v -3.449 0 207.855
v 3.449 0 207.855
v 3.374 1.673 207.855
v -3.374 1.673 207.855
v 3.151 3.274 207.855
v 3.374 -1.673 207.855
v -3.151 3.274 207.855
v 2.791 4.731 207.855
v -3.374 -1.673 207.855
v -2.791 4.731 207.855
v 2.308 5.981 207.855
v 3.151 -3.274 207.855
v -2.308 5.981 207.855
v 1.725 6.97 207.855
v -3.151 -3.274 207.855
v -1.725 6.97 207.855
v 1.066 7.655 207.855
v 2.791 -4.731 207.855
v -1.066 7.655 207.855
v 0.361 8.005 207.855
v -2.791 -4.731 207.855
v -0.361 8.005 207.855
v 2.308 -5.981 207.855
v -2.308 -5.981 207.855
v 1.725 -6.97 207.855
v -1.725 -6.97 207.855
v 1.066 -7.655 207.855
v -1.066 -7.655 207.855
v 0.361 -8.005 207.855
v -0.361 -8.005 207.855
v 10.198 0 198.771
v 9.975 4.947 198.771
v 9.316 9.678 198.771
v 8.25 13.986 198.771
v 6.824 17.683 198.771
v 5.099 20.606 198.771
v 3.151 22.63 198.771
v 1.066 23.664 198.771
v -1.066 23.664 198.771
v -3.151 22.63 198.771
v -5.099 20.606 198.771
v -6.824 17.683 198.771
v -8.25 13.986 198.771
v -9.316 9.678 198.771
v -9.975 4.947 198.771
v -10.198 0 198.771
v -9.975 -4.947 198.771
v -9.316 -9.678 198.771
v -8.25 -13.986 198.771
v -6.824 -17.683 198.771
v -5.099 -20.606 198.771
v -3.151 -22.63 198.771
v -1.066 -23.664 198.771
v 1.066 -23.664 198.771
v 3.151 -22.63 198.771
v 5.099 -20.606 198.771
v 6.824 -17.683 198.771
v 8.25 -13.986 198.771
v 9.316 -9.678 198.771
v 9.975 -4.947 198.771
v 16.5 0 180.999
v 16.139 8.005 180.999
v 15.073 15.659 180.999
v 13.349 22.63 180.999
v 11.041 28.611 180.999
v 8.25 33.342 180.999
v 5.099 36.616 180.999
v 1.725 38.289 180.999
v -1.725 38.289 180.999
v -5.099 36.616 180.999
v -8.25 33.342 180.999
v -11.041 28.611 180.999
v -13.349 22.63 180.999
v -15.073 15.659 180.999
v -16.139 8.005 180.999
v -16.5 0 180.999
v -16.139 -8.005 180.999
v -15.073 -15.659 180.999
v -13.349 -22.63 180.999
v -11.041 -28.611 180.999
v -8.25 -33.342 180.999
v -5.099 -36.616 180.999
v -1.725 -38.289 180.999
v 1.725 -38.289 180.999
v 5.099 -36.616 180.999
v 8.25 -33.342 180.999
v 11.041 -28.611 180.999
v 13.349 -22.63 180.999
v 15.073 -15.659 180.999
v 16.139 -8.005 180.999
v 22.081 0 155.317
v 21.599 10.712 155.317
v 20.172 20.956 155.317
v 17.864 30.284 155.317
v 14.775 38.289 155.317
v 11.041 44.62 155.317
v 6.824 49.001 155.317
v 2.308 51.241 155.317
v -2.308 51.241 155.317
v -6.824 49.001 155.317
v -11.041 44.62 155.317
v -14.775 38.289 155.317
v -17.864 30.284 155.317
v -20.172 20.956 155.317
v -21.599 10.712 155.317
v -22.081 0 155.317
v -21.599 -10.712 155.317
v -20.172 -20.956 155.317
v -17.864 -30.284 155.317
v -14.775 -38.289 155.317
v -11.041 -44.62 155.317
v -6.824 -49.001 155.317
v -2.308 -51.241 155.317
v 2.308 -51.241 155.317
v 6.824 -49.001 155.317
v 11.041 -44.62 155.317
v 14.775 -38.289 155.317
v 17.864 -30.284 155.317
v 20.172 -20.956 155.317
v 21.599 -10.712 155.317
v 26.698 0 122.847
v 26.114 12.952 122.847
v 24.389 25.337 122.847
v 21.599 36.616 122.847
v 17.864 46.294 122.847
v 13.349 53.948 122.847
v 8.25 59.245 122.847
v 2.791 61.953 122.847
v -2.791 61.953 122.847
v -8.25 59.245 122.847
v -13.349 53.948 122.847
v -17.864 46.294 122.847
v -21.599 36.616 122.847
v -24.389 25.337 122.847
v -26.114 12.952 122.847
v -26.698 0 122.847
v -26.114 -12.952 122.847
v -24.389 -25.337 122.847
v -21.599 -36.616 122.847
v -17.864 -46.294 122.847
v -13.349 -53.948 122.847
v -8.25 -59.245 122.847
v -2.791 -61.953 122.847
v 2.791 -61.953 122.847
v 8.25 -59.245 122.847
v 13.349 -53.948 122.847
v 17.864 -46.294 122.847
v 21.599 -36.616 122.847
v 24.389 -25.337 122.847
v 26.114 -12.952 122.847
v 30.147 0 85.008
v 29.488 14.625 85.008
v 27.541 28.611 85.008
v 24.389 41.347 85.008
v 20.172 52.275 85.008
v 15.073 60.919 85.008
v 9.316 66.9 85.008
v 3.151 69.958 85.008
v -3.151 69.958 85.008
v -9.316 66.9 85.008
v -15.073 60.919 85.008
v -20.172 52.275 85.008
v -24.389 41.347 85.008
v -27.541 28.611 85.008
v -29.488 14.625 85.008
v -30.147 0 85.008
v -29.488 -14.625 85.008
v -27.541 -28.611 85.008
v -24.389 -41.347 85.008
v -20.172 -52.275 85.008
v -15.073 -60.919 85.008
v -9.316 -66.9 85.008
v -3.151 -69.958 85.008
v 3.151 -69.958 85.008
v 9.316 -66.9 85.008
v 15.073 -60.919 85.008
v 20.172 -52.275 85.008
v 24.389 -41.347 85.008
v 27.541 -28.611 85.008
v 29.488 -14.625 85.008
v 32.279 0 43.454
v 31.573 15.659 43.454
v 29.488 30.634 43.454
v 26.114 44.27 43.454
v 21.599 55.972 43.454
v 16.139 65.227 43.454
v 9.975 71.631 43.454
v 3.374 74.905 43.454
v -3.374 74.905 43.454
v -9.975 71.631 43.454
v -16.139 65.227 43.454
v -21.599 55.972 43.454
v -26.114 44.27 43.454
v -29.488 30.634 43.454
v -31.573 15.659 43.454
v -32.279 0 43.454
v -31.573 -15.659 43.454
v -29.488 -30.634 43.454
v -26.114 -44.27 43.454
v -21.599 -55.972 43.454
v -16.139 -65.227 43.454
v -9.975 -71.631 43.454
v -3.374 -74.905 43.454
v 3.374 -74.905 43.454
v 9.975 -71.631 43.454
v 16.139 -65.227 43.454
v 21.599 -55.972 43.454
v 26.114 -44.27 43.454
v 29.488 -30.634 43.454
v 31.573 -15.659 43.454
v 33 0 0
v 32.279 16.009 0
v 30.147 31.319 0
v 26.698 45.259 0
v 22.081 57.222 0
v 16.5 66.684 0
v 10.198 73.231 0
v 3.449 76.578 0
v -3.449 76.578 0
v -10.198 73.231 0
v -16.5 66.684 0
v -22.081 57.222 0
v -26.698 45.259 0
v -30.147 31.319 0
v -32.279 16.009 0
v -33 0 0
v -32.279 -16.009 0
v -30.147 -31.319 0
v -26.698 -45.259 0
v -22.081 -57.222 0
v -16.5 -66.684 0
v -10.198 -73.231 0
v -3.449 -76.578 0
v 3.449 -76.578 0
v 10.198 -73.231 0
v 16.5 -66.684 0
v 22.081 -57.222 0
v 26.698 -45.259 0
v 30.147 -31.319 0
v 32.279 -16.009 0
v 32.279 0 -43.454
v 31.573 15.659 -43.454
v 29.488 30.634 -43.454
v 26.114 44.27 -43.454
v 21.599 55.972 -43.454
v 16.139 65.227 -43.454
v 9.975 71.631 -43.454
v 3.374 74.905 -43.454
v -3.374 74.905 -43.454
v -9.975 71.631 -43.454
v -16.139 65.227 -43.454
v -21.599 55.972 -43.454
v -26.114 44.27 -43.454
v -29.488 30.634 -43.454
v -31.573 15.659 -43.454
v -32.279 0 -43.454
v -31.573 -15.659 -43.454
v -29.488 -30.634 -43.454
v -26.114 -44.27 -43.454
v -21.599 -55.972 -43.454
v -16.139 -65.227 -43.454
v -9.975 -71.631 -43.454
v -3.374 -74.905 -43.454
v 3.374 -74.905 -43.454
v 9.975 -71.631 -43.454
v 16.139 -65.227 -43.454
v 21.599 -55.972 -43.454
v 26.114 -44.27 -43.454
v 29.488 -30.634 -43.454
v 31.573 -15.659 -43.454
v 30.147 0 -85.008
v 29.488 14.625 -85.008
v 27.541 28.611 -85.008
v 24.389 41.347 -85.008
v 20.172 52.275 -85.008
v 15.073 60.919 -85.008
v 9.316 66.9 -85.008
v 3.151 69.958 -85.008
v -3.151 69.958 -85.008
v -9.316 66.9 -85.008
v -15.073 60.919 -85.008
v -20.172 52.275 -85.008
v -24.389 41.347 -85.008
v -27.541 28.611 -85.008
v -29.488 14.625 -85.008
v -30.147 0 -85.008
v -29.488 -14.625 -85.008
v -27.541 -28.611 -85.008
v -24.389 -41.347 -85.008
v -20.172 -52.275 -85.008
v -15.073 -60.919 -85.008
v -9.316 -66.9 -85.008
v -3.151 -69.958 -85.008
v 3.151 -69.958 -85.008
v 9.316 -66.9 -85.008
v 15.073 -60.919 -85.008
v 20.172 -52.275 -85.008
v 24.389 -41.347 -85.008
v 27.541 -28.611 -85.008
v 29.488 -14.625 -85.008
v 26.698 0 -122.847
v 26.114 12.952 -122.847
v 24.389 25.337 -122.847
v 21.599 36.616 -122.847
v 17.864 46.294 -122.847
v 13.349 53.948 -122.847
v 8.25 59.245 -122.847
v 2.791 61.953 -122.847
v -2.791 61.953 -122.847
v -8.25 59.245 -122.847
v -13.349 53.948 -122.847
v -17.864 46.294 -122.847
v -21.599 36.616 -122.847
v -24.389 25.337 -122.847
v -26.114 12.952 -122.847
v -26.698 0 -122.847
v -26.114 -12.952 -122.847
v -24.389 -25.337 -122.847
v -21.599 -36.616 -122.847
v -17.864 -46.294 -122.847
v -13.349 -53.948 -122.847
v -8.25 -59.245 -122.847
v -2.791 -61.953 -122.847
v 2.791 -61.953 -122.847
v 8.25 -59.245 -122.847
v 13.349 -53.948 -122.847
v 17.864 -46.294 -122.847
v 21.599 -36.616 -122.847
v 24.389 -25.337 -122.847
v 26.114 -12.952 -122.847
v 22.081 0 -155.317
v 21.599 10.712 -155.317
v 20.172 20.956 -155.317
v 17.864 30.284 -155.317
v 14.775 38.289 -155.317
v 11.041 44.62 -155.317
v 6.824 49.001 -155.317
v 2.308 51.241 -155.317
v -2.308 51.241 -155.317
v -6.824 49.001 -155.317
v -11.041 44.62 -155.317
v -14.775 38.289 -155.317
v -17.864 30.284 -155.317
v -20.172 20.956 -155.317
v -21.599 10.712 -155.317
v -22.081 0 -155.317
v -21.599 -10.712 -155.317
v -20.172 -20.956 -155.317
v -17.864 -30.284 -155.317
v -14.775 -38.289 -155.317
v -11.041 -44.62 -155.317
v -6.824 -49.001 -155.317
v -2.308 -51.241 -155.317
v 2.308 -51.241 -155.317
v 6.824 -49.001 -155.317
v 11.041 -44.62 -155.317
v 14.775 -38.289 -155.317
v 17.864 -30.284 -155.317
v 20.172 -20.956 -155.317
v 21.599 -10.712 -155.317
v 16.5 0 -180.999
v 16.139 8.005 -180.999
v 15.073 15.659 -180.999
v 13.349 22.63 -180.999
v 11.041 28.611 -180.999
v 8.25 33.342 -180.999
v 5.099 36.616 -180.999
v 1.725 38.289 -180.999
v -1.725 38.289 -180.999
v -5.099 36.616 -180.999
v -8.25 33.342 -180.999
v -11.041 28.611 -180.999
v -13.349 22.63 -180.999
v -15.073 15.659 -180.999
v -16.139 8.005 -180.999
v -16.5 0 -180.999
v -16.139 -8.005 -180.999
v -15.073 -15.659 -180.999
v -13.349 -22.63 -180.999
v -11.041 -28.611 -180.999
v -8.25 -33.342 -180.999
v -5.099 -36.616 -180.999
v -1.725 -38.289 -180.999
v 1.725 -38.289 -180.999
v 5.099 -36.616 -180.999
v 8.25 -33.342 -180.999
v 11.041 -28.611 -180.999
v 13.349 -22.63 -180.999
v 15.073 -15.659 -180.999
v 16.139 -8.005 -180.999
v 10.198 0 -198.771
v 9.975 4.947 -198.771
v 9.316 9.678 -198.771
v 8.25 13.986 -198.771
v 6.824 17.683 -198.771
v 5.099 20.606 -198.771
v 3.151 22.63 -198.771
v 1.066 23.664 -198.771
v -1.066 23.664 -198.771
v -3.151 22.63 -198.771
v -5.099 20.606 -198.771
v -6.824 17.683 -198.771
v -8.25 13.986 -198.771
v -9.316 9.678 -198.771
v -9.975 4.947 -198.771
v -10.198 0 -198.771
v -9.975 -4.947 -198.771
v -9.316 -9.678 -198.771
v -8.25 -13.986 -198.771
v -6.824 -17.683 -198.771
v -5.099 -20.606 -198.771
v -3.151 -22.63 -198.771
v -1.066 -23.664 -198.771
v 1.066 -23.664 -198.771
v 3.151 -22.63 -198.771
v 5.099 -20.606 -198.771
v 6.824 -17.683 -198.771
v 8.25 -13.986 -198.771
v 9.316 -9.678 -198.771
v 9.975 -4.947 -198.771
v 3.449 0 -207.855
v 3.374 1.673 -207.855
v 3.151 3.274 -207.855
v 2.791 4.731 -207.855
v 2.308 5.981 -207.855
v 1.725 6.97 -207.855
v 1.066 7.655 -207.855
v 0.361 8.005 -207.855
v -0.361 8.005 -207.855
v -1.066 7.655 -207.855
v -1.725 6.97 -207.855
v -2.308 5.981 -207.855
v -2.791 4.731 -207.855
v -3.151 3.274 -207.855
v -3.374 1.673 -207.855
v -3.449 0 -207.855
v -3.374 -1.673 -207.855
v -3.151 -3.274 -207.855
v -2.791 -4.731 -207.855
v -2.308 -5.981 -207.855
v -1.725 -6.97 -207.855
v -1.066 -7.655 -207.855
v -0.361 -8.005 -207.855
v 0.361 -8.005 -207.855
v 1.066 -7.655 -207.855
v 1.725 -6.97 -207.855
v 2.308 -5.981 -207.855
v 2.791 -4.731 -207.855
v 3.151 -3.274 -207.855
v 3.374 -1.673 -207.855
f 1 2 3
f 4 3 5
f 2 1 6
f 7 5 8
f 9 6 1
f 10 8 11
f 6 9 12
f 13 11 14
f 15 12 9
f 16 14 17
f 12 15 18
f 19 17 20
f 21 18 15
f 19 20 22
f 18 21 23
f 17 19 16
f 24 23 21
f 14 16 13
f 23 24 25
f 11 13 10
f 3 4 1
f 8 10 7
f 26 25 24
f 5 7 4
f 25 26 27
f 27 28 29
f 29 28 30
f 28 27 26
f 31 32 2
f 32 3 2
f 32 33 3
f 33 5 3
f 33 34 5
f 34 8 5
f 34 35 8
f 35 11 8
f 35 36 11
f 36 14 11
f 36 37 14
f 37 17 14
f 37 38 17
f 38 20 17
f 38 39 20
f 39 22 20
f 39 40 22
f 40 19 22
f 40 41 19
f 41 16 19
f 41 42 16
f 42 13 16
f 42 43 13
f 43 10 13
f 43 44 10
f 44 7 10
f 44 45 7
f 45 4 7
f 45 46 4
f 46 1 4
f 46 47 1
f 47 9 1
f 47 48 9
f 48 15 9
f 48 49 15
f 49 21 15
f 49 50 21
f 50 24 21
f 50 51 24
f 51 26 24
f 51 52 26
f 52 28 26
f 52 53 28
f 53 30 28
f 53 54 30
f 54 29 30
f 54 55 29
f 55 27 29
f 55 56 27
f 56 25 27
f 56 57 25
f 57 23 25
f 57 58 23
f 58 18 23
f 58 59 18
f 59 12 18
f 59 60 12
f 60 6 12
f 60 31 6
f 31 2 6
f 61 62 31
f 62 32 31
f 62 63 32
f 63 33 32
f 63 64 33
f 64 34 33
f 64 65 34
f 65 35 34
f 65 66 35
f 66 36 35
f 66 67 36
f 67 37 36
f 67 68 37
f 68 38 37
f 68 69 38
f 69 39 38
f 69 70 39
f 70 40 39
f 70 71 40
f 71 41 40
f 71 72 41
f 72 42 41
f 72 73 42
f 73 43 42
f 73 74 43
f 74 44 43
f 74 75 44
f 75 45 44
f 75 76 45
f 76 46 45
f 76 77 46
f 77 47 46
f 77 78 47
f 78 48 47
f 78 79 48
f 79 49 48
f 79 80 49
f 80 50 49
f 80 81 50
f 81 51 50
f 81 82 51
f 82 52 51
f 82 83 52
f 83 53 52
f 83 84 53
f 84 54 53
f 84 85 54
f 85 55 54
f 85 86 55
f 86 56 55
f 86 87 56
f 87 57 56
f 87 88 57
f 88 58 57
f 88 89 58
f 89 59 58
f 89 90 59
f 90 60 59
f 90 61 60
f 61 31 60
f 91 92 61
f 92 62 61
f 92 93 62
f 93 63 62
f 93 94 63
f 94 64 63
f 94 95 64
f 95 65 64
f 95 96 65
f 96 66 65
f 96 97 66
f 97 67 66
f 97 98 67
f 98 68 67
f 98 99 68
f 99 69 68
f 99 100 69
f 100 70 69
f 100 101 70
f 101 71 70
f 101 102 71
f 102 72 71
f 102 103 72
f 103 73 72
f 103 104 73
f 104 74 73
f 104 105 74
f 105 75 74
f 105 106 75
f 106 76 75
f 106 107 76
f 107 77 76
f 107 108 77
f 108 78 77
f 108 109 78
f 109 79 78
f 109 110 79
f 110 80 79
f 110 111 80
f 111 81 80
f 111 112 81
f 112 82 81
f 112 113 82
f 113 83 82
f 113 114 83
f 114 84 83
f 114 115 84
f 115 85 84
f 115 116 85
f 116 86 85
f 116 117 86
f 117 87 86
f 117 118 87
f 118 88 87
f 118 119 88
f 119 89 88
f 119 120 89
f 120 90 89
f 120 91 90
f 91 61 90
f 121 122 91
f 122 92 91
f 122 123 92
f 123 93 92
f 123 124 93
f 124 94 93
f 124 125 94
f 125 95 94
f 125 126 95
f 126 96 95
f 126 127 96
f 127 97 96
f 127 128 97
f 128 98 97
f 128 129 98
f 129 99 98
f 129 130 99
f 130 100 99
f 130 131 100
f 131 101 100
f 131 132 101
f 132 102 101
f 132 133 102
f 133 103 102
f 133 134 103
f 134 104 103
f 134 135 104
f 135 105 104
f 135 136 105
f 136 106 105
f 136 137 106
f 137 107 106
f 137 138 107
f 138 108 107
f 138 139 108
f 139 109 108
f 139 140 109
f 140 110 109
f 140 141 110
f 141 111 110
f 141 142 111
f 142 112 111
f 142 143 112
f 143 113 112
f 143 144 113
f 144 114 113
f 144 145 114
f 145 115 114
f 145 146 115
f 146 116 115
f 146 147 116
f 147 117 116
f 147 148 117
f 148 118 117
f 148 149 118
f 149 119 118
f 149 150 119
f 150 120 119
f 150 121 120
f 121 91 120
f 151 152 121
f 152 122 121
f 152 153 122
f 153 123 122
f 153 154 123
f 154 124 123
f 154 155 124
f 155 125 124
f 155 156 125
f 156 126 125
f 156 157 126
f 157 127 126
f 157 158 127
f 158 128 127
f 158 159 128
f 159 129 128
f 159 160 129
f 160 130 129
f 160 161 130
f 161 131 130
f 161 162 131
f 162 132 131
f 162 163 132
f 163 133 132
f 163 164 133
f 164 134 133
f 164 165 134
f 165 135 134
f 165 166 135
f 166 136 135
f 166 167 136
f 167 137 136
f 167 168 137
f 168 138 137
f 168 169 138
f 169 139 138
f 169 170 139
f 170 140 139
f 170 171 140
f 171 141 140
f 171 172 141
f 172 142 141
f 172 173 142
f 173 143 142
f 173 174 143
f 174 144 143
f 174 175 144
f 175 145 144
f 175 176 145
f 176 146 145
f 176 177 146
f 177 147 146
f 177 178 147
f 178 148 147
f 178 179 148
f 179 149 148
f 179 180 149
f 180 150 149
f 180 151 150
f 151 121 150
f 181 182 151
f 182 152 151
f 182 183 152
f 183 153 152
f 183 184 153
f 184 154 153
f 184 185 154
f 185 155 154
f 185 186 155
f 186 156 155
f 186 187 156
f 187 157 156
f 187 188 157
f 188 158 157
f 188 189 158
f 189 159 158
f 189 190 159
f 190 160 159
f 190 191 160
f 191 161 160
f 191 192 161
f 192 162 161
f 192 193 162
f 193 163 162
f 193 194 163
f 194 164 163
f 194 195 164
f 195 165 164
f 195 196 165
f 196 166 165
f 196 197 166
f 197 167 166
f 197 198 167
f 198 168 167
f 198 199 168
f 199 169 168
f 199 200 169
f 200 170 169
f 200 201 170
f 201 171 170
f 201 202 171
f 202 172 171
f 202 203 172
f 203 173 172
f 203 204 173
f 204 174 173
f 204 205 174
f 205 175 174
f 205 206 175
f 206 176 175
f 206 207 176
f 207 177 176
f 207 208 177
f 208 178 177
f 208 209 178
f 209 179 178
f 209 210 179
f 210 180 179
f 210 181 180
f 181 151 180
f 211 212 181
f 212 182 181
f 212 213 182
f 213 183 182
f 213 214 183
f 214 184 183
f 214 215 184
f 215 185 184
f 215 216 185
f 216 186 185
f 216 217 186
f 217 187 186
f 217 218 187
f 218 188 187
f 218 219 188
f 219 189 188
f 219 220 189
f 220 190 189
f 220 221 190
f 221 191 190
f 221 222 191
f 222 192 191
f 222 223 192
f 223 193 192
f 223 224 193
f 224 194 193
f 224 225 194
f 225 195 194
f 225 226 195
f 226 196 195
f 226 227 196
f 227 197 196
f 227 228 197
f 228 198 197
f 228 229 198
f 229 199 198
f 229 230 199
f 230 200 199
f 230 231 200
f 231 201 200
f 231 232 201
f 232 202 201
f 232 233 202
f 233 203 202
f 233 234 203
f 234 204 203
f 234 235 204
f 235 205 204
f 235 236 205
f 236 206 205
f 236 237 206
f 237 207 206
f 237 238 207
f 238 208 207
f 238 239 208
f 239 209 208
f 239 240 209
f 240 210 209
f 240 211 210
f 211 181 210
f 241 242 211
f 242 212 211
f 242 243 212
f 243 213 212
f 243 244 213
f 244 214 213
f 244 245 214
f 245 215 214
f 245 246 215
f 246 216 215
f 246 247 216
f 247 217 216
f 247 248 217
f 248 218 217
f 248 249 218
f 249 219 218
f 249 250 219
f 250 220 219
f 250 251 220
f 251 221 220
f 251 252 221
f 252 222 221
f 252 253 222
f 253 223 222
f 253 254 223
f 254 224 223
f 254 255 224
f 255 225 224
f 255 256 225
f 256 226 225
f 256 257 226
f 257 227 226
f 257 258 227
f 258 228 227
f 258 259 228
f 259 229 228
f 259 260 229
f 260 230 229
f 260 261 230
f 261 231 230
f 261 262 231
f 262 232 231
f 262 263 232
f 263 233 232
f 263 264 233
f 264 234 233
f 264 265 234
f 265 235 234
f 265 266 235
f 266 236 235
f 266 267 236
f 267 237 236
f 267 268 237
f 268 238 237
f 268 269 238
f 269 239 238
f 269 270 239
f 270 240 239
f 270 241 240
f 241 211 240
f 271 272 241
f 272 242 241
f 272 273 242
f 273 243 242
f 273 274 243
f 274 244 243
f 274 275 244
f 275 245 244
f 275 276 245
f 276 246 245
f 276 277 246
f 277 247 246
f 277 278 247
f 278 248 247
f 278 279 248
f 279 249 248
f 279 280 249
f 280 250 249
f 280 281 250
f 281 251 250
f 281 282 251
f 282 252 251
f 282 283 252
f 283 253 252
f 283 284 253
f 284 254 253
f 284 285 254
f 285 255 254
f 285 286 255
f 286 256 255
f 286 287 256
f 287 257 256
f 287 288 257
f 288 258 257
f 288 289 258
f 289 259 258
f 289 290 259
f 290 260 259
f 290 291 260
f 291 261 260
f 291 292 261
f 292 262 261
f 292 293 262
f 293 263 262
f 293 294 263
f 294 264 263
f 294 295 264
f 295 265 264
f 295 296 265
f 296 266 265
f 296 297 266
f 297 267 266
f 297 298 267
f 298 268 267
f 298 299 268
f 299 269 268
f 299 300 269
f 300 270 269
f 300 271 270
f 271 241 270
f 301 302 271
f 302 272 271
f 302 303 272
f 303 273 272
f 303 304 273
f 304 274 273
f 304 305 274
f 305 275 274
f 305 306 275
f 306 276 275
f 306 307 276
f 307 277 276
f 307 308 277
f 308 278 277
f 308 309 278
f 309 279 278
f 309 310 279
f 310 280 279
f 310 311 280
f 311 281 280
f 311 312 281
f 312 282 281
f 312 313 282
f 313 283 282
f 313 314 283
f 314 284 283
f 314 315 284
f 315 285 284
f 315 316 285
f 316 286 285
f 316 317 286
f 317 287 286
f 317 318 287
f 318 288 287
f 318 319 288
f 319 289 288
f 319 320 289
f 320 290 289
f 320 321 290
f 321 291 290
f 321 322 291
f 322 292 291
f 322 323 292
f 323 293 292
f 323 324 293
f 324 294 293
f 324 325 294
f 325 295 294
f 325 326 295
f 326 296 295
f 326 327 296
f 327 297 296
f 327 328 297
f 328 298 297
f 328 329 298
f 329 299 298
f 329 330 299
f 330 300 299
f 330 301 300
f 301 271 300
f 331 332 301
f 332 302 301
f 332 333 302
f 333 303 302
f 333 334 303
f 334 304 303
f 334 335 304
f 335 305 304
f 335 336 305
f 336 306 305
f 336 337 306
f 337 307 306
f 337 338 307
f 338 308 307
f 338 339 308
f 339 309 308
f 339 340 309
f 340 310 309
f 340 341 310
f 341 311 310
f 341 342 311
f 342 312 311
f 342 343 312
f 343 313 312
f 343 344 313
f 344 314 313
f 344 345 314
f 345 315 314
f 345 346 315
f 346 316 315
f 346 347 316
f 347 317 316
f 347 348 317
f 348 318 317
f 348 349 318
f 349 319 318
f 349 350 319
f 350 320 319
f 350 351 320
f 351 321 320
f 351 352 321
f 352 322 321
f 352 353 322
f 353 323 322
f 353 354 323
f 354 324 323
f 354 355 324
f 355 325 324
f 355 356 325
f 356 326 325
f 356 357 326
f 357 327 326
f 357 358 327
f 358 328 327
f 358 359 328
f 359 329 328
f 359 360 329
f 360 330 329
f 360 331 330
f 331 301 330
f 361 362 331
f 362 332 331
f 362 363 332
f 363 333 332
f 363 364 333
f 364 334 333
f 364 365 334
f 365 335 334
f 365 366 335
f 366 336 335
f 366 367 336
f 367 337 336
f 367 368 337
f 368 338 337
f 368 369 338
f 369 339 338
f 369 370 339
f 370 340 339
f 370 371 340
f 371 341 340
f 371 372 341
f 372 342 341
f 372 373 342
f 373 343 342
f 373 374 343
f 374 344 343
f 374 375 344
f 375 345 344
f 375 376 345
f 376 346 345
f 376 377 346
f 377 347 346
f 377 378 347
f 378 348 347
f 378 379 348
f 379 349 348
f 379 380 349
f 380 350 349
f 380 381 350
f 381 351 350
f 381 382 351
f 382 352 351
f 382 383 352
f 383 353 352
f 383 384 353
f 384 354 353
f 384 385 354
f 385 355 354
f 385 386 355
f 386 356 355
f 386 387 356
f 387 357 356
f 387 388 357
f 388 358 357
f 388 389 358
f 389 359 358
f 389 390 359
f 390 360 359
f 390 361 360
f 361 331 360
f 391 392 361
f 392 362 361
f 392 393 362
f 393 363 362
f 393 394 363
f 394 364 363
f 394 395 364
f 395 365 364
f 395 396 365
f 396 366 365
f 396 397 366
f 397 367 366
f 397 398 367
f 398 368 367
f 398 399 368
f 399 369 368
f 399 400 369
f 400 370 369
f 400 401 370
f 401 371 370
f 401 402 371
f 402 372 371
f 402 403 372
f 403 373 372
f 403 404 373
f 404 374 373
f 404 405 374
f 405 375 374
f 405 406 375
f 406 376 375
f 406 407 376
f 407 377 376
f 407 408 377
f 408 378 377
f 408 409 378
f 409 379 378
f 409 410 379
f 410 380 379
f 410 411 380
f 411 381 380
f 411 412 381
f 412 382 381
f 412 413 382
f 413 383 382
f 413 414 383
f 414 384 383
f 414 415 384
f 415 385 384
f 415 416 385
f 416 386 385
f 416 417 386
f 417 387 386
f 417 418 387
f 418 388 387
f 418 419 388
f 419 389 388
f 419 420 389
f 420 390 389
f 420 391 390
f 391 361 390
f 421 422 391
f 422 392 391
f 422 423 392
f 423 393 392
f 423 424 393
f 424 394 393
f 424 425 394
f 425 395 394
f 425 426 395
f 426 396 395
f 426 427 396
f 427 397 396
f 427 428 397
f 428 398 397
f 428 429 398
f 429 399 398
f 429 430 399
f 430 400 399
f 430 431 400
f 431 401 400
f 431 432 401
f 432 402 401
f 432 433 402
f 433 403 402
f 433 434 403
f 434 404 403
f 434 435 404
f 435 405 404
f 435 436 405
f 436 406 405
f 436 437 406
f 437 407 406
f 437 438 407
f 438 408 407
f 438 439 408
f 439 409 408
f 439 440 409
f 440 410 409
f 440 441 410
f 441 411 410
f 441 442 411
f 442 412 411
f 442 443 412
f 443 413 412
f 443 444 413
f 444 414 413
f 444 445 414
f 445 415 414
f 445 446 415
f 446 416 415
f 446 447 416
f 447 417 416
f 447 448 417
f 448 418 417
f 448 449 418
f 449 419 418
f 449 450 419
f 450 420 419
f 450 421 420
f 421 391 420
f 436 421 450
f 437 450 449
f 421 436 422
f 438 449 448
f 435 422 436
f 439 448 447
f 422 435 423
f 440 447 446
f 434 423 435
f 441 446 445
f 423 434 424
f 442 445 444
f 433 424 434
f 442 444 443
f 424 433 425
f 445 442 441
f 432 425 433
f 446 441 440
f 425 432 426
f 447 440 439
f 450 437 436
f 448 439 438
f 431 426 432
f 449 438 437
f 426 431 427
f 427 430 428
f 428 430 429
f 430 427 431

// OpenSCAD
// Generated by SolidPython 1.0.1 on 2020-07-29 00:46:45


scale(v = [3, 7, 19]) {
	sphere(r = 11);
}
/***********************************************
*********      SolidPython code:      **********
************************************************
 
# import packages: SolidPython
from solid import *
from solid.utils import *
from itertools import chain, combinations, permutations


class Resize:

    def __init__(self, scad_file):
        self.scad_file = scad_file
        #self.scad_file = import_scad(scad_file)
        # cone/cylinder param:
        self.r1 = 0
        self.r2 = 0
        self.h = 0
        # rectangular prism param:
        self.w = 0
        self.l = 0
        # ellipse param:
        self.r = 0

    # import OpenScad code (file name corresponds to shape)


    # classify shape + parameters
    def assign(self, param1, param2, param3):
        if self.scad_file == 'cone.scad':
            self.r1 = param1
            self.r2 = param2
            self.h = param3
        elif self.scad_file == 'cylinder.scad':
            self.r1 = param1
            self.r2 = param2
            self.h = param3
        elif self.scad_file == 'rectangularPrism.scad':
            self.h = param1
            self.l = param2
            self.w = param3
        else:
            self.r = param1
            self.h = param2

    # resize parameters
    def iterate(self):
        x = range(3, 20, 2)
        i = 1
        if self.scad_file == 'cone.scad':
            tempList = list(permutations(x, 2))
            for temp in tempList:
                param1 = temp[0]
                param2 = temp[1]
                filepath = 'produced_scad_files/' + 'cone' + str(param1) + '_' + str(param2) + '_' + '.scad'
                scad_render_to_file(cylinder(h=param1, r1=param2, r2=0), filepath)

        elif self.scad_file == 'cylinder.scad':
            tempList = list(permutations(x, 3))
            for temp in tempList:
                param1 = temp[0]
                param2 = temp[1]
                filepath = 'produced_scad_files/' + 'cylinder' + str(param1) + '_' + str(param2) + '_' + '.scad'
                scad_render_to_file(cylinder(h=param1, r1=param2, r2=param2), filepath)

        elif self.scad_file == 'rectangularPrism.scad':
            tempList = list(permutations(x, 3))
            for temp in tempList:
                param1 = temp[0]
                param2 = temp[1]
                param3 = temp[2]
                filepath = 'produced_scad_files/' + 'rectangularPrism' + str(param1) + '_' + str(param2) + '_' + str(
                    param3) + '.scad'
                scad_render_to_file(cube(size=(param1, param2, param3)), filepath)

        elif self.scad_file == 'ellipse.scad':
            tempList = list(permutations(x, 4))
            for temp in tempList:
                param1 = temp[0]
                param2 = temp[1]
                param3 = temp[2]
                param4 = temp[3]
                filepath = 'produced_scad_files/' + 'ellipse' + str(param1) + '_' + str(param2) + '_' + str(param3) + '_' + str(param4) + '.scad'
                scad_render_to_file(scale([param1, param2, param3])(sphere(r=param4)), filepath)

    def render_to_scadfile(self):
        scad_render_to_file(scad, 'example.scad') 
 
************************************************/
